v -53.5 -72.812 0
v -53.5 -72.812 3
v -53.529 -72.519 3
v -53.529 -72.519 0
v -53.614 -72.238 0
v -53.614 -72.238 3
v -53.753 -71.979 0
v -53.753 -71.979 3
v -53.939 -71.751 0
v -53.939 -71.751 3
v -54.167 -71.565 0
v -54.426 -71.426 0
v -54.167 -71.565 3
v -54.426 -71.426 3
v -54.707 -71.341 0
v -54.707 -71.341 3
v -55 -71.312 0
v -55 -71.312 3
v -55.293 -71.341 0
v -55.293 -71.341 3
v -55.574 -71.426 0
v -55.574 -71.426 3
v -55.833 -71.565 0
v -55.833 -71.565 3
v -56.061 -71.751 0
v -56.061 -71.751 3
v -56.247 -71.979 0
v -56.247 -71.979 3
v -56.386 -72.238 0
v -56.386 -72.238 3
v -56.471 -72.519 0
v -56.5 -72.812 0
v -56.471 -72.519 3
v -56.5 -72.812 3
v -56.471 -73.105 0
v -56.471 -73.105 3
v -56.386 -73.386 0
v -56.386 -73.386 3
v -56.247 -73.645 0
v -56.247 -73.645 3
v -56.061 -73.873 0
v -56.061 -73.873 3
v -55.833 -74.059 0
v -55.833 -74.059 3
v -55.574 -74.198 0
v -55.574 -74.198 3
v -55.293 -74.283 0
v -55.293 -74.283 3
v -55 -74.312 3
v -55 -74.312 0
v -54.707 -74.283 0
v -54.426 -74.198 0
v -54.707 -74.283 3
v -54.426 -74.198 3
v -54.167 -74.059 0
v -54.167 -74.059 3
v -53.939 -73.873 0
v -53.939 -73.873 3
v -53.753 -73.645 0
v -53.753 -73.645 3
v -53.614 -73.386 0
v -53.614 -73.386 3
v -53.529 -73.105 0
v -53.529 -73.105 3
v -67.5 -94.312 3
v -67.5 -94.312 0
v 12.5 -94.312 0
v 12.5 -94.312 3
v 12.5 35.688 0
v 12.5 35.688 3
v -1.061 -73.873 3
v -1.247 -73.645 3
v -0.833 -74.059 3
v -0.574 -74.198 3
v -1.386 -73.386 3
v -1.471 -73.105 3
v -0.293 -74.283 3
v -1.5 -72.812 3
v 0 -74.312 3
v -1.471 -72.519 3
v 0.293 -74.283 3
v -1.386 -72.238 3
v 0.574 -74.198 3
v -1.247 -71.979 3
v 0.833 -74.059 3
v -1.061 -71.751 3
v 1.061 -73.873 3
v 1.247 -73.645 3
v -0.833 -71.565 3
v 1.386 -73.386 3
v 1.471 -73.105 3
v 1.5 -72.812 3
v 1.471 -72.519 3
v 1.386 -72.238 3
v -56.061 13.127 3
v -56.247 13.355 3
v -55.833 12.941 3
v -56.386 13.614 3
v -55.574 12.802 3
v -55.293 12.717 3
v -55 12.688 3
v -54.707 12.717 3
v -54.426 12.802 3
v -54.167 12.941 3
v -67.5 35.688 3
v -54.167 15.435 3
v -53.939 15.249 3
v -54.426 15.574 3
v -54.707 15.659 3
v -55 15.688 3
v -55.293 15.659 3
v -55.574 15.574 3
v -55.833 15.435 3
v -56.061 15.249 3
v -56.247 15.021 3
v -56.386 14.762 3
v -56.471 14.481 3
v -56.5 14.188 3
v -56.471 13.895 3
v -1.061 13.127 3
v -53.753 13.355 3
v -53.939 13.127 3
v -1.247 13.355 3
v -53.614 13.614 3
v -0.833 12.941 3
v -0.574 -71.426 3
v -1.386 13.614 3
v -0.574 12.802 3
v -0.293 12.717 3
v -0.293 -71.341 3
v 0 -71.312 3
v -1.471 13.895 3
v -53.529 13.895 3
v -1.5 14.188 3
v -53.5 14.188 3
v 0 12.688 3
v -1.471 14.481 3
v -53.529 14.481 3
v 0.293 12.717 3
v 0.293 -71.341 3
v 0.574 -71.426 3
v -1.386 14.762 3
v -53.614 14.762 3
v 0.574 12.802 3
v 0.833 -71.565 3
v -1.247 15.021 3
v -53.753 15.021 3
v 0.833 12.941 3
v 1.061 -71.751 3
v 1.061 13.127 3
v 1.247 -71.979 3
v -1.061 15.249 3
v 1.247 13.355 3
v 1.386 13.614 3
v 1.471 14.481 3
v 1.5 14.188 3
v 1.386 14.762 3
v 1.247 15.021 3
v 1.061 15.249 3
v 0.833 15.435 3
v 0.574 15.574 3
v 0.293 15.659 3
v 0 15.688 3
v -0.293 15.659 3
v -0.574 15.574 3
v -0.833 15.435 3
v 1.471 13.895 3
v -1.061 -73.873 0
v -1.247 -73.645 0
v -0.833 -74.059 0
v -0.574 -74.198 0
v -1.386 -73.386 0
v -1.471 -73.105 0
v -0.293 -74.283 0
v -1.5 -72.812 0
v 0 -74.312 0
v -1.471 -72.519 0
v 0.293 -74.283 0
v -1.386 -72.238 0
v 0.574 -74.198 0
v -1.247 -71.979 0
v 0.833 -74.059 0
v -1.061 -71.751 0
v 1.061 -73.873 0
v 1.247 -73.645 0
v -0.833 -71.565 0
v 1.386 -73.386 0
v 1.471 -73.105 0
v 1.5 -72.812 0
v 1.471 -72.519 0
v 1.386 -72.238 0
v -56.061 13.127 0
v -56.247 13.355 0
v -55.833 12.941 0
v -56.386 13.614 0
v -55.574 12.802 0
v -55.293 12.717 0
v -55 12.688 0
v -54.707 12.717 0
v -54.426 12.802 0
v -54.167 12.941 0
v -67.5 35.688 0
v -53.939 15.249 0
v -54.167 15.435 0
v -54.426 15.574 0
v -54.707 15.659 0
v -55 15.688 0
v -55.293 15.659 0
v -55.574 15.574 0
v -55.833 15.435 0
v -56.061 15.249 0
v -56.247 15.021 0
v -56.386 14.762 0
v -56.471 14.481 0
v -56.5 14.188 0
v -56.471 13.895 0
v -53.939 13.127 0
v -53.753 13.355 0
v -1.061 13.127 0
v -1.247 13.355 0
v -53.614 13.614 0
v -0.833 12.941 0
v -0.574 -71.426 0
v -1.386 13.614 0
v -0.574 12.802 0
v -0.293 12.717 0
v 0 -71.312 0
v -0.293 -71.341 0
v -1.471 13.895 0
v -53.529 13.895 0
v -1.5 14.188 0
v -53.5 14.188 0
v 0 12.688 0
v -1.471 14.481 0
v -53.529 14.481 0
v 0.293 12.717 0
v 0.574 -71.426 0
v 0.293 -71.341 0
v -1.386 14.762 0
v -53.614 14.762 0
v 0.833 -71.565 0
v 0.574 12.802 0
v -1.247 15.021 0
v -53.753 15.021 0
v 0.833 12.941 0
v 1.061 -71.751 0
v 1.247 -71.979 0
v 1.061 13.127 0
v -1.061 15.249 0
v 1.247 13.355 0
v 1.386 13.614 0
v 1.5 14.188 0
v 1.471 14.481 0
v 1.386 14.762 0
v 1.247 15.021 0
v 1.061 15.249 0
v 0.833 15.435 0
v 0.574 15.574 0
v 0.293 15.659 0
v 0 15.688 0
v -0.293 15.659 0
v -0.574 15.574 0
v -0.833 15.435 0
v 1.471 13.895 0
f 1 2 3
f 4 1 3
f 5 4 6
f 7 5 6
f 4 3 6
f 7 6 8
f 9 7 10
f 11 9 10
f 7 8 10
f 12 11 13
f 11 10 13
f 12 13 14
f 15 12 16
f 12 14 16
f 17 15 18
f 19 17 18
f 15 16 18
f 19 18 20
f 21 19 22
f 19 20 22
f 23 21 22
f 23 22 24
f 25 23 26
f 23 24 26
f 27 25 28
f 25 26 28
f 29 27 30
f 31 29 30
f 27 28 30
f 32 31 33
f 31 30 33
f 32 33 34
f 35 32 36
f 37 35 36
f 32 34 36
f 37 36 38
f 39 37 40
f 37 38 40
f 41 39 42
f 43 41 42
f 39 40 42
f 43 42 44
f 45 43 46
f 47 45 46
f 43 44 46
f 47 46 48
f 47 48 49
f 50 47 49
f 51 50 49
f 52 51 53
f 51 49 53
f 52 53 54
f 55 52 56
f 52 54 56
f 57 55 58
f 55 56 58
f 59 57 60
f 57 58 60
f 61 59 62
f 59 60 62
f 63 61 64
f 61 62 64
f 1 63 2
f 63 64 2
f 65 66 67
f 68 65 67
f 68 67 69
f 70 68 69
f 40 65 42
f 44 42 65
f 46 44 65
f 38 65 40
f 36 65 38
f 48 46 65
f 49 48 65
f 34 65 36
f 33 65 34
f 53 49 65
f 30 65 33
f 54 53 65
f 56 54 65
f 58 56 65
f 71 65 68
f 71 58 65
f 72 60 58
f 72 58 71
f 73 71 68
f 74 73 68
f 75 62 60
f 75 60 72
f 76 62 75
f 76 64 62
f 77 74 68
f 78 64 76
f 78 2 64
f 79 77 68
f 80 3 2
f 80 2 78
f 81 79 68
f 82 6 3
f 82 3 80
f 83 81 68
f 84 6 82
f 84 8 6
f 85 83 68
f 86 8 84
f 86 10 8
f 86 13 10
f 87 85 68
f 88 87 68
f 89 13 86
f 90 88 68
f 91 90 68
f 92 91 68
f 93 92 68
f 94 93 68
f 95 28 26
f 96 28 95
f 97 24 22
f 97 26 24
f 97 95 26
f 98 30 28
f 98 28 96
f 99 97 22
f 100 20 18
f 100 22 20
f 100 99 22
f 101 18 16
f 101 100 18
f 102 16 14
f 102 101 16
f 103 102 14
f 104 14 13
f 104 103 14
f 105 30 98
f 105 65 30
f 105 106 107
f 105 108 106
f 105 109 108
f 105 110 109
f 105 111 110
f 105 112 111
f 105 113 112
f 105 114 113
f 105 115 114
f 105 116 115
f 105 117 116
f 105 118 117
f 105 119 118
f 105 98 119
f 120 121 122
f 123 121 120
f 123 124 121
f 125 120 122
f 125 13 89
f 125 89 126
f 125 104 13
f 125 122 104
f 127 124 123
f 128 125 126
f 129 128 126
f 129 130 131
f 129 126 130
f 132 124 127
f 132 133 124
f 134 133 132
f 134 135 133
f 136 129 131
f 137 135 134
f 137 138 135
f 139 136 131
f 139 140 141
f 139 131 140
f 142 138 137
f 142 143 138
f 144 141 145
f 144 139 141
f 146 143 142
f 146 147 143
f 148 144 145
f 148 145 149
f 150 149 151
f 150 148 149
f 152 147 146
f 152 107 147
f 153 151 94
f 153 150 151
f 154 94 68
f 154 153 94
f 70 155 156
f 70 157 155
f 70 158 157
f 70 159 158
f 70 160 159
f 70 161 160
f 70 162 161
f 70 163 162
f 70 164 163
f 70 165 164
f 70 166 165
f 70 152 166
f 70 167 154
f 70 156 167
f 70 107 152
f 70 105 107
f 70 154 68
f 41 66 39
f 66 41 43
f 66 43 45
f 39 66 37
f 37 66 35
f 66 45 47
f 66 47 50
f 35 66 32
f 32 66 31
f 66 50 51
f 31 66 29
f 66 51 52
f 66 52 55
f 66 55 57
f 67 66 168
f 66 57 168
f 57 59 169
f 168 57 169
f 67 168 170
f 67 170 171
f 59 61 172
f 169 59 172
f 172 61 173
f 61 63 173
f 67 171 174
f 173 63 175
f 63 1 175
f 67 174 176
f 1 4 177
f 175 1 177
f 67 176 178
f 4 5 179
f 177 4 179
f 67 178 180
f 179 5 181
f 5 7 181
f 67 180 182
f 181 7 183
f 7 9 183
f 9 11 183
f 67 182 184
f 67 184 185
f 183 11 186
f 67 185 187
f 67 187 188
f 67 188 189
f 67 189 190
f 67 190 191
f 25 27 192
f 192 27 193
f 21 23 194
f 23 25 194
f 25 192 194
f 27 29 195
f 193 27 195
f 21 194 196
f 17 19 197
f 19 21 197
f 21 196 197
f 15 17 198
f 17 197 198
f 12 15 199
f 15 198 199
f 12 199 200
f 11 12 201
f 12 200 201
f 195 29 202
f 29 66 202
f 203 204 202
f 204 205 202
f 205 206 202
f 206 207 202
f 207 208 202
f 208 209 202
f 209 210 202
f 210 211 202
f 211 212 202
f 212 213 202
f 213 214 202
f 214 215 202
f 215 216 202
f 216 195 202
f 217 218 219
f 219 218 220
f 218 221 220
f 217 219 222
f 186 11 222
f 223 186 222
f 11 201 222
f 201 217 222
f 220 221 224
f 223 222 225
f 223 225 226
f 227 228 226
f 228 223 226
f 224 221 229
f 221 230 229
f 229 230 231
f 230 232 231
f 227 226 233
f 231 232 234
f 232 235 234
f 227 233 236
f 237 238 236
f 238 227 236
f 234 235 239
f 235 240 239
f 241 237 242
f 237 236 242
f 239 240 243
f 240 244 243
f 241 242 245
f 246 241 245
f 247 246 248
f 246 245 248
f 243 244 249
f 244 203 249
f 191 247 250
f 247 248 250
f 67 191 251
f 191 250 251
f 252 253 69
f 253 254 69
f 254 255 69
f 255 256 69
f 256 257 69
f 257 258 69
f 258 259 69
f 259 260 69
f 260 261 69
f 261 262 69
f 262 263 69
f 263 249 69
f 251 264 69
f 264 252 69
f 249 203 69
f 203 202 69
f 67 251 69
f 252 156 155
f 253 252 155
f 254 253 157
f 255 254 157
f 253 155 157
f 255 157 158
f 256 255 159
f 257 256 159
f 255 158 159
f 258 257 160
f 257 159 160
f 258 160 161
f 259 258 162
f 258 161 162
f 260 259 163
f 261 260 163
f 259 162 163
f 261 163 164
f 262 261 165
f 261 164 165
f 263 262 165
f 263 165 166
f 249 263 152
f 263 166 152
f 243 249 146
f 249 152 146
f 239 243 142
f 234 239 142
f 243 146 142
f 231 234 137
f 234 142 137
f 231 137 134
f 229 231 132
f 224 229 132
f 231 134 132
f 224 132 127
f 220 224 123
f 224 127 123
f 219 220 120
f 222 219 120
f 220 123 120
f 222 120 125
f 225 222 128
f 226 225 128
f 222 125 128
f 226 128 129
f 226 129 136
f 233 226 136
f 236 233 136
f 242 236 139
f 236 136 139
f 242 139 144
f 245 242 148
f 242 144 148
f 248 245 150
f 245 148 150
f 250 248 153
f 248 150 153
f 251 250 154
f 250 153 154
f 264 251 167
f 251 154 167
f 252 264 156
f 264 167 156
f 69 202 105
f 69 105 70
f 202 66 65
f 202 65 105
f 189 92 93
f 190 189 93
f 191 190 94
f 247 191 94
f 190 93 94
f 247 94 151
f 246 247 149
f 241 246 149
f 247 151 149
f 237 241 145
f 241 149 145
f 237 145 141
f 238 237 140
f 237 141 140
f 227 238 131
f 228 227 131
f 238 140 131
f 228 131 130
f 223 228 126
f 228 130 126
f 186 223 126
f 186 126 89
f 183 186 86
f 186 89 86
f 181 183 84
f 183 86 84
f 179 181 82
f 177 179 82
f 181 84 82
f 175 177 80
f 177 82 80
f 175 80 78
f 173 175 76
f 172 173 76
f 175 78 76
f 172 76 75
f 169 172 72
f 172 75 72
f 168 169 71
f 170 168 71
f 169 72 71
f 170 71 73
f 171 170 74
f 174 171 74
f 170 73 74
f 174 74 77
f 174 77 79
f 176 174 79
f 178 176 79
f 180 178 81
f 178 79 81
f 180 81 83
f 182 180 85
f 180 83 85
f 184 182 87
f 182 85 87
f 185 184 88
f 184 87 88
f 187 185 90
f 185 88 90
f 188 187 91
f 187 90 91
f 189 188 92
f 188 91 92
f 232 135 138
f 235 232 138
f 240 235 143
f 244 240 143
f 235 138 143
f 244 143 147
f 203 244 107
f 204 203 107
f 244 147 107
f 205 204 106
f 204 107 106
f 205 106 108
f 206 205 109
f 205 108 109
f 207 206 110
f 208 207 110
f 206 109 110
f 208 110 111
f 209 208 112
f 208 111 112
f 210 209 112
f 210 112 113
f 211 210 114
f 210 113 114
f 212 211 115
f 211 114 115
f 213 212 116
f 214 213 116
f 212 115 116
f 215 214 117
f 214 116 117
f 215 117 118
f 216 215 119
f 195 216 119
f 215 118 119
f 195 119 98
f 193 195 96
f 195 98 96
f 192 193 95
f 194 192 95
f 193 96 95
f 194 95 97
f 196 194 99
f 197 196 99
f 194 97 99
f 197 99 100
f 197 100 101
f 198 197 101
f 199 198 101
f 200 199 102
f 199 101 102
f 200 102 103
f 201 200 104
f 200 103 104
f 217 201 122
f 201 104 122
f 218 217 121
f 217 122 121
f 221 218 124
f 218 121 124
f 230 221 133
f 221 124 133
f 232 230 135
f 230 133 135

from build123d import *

# Parameters (mm, degrees)
ESBO_O1_W                = 80
ESBO_O1_H                = 130
RESSALTO_EXTRUS_O1_DEPTH = 3
ESBO_O2_R                = 1.5
CORTE_EXTRUS_O1_DEPTH    = 3
ESBO_O2_3_R              = 1.5
CORTE_EXTRUS_O2_DEPTH    = 3
ESBO_O2_4_R              = 1.5
CORTE_EXTRUS_O3_DEPTH    = 3


with BuildPart() as part:
    # Esboço1 → Ressalto-extrusão1 (new body)
    with BuildSketch(Plane.XY):
        with Locations((-27.5, -29.311993606)):
            Rectangle(ESBO_O1_W, ESBO_O1_H)
    extrude(amount=RESSALTO_EXTRUS_O1_DEPTH)

    # Esboço2 → Corte-extrusão1 (cut)
    with BuildSketch(Plane.XY.offset(3)):
        with Locations((-55, 14.188006394)):
            Circle(ESBO_O2_R)
    extrude(amount=-CORTE_EXTRUS_O1_DEPTH, mode=Mode.SUBTRACT)

    # Esboço2<3> → Corte-extrusão2 (cut)
    with BuildSketch(Plane.XY.offset(3)):
        with Locations((0, 14.188006394)):
            Circle(ESBO_O2_3_R)
    extrude(amount=-CORTE_EXTRUS_O2_DEPTH, mode=Mode.SUBTRACT)

    # Esboço2<4> → Corte-extrusão3 (cut)
    with BuildSketch(Plane.XY.offset(3)):
        with Locations((0, -72.811993606)):
            Circle(ESBO_O2_4_R)
        with Locations((-55, -72.811993606)):
            Circle(ESBO_O2_4_R)
    extrude(amount=-CORTE_EXTRUS_O3_DEPTH, mode=Mode.SUBTRACT)


solid = part.part
